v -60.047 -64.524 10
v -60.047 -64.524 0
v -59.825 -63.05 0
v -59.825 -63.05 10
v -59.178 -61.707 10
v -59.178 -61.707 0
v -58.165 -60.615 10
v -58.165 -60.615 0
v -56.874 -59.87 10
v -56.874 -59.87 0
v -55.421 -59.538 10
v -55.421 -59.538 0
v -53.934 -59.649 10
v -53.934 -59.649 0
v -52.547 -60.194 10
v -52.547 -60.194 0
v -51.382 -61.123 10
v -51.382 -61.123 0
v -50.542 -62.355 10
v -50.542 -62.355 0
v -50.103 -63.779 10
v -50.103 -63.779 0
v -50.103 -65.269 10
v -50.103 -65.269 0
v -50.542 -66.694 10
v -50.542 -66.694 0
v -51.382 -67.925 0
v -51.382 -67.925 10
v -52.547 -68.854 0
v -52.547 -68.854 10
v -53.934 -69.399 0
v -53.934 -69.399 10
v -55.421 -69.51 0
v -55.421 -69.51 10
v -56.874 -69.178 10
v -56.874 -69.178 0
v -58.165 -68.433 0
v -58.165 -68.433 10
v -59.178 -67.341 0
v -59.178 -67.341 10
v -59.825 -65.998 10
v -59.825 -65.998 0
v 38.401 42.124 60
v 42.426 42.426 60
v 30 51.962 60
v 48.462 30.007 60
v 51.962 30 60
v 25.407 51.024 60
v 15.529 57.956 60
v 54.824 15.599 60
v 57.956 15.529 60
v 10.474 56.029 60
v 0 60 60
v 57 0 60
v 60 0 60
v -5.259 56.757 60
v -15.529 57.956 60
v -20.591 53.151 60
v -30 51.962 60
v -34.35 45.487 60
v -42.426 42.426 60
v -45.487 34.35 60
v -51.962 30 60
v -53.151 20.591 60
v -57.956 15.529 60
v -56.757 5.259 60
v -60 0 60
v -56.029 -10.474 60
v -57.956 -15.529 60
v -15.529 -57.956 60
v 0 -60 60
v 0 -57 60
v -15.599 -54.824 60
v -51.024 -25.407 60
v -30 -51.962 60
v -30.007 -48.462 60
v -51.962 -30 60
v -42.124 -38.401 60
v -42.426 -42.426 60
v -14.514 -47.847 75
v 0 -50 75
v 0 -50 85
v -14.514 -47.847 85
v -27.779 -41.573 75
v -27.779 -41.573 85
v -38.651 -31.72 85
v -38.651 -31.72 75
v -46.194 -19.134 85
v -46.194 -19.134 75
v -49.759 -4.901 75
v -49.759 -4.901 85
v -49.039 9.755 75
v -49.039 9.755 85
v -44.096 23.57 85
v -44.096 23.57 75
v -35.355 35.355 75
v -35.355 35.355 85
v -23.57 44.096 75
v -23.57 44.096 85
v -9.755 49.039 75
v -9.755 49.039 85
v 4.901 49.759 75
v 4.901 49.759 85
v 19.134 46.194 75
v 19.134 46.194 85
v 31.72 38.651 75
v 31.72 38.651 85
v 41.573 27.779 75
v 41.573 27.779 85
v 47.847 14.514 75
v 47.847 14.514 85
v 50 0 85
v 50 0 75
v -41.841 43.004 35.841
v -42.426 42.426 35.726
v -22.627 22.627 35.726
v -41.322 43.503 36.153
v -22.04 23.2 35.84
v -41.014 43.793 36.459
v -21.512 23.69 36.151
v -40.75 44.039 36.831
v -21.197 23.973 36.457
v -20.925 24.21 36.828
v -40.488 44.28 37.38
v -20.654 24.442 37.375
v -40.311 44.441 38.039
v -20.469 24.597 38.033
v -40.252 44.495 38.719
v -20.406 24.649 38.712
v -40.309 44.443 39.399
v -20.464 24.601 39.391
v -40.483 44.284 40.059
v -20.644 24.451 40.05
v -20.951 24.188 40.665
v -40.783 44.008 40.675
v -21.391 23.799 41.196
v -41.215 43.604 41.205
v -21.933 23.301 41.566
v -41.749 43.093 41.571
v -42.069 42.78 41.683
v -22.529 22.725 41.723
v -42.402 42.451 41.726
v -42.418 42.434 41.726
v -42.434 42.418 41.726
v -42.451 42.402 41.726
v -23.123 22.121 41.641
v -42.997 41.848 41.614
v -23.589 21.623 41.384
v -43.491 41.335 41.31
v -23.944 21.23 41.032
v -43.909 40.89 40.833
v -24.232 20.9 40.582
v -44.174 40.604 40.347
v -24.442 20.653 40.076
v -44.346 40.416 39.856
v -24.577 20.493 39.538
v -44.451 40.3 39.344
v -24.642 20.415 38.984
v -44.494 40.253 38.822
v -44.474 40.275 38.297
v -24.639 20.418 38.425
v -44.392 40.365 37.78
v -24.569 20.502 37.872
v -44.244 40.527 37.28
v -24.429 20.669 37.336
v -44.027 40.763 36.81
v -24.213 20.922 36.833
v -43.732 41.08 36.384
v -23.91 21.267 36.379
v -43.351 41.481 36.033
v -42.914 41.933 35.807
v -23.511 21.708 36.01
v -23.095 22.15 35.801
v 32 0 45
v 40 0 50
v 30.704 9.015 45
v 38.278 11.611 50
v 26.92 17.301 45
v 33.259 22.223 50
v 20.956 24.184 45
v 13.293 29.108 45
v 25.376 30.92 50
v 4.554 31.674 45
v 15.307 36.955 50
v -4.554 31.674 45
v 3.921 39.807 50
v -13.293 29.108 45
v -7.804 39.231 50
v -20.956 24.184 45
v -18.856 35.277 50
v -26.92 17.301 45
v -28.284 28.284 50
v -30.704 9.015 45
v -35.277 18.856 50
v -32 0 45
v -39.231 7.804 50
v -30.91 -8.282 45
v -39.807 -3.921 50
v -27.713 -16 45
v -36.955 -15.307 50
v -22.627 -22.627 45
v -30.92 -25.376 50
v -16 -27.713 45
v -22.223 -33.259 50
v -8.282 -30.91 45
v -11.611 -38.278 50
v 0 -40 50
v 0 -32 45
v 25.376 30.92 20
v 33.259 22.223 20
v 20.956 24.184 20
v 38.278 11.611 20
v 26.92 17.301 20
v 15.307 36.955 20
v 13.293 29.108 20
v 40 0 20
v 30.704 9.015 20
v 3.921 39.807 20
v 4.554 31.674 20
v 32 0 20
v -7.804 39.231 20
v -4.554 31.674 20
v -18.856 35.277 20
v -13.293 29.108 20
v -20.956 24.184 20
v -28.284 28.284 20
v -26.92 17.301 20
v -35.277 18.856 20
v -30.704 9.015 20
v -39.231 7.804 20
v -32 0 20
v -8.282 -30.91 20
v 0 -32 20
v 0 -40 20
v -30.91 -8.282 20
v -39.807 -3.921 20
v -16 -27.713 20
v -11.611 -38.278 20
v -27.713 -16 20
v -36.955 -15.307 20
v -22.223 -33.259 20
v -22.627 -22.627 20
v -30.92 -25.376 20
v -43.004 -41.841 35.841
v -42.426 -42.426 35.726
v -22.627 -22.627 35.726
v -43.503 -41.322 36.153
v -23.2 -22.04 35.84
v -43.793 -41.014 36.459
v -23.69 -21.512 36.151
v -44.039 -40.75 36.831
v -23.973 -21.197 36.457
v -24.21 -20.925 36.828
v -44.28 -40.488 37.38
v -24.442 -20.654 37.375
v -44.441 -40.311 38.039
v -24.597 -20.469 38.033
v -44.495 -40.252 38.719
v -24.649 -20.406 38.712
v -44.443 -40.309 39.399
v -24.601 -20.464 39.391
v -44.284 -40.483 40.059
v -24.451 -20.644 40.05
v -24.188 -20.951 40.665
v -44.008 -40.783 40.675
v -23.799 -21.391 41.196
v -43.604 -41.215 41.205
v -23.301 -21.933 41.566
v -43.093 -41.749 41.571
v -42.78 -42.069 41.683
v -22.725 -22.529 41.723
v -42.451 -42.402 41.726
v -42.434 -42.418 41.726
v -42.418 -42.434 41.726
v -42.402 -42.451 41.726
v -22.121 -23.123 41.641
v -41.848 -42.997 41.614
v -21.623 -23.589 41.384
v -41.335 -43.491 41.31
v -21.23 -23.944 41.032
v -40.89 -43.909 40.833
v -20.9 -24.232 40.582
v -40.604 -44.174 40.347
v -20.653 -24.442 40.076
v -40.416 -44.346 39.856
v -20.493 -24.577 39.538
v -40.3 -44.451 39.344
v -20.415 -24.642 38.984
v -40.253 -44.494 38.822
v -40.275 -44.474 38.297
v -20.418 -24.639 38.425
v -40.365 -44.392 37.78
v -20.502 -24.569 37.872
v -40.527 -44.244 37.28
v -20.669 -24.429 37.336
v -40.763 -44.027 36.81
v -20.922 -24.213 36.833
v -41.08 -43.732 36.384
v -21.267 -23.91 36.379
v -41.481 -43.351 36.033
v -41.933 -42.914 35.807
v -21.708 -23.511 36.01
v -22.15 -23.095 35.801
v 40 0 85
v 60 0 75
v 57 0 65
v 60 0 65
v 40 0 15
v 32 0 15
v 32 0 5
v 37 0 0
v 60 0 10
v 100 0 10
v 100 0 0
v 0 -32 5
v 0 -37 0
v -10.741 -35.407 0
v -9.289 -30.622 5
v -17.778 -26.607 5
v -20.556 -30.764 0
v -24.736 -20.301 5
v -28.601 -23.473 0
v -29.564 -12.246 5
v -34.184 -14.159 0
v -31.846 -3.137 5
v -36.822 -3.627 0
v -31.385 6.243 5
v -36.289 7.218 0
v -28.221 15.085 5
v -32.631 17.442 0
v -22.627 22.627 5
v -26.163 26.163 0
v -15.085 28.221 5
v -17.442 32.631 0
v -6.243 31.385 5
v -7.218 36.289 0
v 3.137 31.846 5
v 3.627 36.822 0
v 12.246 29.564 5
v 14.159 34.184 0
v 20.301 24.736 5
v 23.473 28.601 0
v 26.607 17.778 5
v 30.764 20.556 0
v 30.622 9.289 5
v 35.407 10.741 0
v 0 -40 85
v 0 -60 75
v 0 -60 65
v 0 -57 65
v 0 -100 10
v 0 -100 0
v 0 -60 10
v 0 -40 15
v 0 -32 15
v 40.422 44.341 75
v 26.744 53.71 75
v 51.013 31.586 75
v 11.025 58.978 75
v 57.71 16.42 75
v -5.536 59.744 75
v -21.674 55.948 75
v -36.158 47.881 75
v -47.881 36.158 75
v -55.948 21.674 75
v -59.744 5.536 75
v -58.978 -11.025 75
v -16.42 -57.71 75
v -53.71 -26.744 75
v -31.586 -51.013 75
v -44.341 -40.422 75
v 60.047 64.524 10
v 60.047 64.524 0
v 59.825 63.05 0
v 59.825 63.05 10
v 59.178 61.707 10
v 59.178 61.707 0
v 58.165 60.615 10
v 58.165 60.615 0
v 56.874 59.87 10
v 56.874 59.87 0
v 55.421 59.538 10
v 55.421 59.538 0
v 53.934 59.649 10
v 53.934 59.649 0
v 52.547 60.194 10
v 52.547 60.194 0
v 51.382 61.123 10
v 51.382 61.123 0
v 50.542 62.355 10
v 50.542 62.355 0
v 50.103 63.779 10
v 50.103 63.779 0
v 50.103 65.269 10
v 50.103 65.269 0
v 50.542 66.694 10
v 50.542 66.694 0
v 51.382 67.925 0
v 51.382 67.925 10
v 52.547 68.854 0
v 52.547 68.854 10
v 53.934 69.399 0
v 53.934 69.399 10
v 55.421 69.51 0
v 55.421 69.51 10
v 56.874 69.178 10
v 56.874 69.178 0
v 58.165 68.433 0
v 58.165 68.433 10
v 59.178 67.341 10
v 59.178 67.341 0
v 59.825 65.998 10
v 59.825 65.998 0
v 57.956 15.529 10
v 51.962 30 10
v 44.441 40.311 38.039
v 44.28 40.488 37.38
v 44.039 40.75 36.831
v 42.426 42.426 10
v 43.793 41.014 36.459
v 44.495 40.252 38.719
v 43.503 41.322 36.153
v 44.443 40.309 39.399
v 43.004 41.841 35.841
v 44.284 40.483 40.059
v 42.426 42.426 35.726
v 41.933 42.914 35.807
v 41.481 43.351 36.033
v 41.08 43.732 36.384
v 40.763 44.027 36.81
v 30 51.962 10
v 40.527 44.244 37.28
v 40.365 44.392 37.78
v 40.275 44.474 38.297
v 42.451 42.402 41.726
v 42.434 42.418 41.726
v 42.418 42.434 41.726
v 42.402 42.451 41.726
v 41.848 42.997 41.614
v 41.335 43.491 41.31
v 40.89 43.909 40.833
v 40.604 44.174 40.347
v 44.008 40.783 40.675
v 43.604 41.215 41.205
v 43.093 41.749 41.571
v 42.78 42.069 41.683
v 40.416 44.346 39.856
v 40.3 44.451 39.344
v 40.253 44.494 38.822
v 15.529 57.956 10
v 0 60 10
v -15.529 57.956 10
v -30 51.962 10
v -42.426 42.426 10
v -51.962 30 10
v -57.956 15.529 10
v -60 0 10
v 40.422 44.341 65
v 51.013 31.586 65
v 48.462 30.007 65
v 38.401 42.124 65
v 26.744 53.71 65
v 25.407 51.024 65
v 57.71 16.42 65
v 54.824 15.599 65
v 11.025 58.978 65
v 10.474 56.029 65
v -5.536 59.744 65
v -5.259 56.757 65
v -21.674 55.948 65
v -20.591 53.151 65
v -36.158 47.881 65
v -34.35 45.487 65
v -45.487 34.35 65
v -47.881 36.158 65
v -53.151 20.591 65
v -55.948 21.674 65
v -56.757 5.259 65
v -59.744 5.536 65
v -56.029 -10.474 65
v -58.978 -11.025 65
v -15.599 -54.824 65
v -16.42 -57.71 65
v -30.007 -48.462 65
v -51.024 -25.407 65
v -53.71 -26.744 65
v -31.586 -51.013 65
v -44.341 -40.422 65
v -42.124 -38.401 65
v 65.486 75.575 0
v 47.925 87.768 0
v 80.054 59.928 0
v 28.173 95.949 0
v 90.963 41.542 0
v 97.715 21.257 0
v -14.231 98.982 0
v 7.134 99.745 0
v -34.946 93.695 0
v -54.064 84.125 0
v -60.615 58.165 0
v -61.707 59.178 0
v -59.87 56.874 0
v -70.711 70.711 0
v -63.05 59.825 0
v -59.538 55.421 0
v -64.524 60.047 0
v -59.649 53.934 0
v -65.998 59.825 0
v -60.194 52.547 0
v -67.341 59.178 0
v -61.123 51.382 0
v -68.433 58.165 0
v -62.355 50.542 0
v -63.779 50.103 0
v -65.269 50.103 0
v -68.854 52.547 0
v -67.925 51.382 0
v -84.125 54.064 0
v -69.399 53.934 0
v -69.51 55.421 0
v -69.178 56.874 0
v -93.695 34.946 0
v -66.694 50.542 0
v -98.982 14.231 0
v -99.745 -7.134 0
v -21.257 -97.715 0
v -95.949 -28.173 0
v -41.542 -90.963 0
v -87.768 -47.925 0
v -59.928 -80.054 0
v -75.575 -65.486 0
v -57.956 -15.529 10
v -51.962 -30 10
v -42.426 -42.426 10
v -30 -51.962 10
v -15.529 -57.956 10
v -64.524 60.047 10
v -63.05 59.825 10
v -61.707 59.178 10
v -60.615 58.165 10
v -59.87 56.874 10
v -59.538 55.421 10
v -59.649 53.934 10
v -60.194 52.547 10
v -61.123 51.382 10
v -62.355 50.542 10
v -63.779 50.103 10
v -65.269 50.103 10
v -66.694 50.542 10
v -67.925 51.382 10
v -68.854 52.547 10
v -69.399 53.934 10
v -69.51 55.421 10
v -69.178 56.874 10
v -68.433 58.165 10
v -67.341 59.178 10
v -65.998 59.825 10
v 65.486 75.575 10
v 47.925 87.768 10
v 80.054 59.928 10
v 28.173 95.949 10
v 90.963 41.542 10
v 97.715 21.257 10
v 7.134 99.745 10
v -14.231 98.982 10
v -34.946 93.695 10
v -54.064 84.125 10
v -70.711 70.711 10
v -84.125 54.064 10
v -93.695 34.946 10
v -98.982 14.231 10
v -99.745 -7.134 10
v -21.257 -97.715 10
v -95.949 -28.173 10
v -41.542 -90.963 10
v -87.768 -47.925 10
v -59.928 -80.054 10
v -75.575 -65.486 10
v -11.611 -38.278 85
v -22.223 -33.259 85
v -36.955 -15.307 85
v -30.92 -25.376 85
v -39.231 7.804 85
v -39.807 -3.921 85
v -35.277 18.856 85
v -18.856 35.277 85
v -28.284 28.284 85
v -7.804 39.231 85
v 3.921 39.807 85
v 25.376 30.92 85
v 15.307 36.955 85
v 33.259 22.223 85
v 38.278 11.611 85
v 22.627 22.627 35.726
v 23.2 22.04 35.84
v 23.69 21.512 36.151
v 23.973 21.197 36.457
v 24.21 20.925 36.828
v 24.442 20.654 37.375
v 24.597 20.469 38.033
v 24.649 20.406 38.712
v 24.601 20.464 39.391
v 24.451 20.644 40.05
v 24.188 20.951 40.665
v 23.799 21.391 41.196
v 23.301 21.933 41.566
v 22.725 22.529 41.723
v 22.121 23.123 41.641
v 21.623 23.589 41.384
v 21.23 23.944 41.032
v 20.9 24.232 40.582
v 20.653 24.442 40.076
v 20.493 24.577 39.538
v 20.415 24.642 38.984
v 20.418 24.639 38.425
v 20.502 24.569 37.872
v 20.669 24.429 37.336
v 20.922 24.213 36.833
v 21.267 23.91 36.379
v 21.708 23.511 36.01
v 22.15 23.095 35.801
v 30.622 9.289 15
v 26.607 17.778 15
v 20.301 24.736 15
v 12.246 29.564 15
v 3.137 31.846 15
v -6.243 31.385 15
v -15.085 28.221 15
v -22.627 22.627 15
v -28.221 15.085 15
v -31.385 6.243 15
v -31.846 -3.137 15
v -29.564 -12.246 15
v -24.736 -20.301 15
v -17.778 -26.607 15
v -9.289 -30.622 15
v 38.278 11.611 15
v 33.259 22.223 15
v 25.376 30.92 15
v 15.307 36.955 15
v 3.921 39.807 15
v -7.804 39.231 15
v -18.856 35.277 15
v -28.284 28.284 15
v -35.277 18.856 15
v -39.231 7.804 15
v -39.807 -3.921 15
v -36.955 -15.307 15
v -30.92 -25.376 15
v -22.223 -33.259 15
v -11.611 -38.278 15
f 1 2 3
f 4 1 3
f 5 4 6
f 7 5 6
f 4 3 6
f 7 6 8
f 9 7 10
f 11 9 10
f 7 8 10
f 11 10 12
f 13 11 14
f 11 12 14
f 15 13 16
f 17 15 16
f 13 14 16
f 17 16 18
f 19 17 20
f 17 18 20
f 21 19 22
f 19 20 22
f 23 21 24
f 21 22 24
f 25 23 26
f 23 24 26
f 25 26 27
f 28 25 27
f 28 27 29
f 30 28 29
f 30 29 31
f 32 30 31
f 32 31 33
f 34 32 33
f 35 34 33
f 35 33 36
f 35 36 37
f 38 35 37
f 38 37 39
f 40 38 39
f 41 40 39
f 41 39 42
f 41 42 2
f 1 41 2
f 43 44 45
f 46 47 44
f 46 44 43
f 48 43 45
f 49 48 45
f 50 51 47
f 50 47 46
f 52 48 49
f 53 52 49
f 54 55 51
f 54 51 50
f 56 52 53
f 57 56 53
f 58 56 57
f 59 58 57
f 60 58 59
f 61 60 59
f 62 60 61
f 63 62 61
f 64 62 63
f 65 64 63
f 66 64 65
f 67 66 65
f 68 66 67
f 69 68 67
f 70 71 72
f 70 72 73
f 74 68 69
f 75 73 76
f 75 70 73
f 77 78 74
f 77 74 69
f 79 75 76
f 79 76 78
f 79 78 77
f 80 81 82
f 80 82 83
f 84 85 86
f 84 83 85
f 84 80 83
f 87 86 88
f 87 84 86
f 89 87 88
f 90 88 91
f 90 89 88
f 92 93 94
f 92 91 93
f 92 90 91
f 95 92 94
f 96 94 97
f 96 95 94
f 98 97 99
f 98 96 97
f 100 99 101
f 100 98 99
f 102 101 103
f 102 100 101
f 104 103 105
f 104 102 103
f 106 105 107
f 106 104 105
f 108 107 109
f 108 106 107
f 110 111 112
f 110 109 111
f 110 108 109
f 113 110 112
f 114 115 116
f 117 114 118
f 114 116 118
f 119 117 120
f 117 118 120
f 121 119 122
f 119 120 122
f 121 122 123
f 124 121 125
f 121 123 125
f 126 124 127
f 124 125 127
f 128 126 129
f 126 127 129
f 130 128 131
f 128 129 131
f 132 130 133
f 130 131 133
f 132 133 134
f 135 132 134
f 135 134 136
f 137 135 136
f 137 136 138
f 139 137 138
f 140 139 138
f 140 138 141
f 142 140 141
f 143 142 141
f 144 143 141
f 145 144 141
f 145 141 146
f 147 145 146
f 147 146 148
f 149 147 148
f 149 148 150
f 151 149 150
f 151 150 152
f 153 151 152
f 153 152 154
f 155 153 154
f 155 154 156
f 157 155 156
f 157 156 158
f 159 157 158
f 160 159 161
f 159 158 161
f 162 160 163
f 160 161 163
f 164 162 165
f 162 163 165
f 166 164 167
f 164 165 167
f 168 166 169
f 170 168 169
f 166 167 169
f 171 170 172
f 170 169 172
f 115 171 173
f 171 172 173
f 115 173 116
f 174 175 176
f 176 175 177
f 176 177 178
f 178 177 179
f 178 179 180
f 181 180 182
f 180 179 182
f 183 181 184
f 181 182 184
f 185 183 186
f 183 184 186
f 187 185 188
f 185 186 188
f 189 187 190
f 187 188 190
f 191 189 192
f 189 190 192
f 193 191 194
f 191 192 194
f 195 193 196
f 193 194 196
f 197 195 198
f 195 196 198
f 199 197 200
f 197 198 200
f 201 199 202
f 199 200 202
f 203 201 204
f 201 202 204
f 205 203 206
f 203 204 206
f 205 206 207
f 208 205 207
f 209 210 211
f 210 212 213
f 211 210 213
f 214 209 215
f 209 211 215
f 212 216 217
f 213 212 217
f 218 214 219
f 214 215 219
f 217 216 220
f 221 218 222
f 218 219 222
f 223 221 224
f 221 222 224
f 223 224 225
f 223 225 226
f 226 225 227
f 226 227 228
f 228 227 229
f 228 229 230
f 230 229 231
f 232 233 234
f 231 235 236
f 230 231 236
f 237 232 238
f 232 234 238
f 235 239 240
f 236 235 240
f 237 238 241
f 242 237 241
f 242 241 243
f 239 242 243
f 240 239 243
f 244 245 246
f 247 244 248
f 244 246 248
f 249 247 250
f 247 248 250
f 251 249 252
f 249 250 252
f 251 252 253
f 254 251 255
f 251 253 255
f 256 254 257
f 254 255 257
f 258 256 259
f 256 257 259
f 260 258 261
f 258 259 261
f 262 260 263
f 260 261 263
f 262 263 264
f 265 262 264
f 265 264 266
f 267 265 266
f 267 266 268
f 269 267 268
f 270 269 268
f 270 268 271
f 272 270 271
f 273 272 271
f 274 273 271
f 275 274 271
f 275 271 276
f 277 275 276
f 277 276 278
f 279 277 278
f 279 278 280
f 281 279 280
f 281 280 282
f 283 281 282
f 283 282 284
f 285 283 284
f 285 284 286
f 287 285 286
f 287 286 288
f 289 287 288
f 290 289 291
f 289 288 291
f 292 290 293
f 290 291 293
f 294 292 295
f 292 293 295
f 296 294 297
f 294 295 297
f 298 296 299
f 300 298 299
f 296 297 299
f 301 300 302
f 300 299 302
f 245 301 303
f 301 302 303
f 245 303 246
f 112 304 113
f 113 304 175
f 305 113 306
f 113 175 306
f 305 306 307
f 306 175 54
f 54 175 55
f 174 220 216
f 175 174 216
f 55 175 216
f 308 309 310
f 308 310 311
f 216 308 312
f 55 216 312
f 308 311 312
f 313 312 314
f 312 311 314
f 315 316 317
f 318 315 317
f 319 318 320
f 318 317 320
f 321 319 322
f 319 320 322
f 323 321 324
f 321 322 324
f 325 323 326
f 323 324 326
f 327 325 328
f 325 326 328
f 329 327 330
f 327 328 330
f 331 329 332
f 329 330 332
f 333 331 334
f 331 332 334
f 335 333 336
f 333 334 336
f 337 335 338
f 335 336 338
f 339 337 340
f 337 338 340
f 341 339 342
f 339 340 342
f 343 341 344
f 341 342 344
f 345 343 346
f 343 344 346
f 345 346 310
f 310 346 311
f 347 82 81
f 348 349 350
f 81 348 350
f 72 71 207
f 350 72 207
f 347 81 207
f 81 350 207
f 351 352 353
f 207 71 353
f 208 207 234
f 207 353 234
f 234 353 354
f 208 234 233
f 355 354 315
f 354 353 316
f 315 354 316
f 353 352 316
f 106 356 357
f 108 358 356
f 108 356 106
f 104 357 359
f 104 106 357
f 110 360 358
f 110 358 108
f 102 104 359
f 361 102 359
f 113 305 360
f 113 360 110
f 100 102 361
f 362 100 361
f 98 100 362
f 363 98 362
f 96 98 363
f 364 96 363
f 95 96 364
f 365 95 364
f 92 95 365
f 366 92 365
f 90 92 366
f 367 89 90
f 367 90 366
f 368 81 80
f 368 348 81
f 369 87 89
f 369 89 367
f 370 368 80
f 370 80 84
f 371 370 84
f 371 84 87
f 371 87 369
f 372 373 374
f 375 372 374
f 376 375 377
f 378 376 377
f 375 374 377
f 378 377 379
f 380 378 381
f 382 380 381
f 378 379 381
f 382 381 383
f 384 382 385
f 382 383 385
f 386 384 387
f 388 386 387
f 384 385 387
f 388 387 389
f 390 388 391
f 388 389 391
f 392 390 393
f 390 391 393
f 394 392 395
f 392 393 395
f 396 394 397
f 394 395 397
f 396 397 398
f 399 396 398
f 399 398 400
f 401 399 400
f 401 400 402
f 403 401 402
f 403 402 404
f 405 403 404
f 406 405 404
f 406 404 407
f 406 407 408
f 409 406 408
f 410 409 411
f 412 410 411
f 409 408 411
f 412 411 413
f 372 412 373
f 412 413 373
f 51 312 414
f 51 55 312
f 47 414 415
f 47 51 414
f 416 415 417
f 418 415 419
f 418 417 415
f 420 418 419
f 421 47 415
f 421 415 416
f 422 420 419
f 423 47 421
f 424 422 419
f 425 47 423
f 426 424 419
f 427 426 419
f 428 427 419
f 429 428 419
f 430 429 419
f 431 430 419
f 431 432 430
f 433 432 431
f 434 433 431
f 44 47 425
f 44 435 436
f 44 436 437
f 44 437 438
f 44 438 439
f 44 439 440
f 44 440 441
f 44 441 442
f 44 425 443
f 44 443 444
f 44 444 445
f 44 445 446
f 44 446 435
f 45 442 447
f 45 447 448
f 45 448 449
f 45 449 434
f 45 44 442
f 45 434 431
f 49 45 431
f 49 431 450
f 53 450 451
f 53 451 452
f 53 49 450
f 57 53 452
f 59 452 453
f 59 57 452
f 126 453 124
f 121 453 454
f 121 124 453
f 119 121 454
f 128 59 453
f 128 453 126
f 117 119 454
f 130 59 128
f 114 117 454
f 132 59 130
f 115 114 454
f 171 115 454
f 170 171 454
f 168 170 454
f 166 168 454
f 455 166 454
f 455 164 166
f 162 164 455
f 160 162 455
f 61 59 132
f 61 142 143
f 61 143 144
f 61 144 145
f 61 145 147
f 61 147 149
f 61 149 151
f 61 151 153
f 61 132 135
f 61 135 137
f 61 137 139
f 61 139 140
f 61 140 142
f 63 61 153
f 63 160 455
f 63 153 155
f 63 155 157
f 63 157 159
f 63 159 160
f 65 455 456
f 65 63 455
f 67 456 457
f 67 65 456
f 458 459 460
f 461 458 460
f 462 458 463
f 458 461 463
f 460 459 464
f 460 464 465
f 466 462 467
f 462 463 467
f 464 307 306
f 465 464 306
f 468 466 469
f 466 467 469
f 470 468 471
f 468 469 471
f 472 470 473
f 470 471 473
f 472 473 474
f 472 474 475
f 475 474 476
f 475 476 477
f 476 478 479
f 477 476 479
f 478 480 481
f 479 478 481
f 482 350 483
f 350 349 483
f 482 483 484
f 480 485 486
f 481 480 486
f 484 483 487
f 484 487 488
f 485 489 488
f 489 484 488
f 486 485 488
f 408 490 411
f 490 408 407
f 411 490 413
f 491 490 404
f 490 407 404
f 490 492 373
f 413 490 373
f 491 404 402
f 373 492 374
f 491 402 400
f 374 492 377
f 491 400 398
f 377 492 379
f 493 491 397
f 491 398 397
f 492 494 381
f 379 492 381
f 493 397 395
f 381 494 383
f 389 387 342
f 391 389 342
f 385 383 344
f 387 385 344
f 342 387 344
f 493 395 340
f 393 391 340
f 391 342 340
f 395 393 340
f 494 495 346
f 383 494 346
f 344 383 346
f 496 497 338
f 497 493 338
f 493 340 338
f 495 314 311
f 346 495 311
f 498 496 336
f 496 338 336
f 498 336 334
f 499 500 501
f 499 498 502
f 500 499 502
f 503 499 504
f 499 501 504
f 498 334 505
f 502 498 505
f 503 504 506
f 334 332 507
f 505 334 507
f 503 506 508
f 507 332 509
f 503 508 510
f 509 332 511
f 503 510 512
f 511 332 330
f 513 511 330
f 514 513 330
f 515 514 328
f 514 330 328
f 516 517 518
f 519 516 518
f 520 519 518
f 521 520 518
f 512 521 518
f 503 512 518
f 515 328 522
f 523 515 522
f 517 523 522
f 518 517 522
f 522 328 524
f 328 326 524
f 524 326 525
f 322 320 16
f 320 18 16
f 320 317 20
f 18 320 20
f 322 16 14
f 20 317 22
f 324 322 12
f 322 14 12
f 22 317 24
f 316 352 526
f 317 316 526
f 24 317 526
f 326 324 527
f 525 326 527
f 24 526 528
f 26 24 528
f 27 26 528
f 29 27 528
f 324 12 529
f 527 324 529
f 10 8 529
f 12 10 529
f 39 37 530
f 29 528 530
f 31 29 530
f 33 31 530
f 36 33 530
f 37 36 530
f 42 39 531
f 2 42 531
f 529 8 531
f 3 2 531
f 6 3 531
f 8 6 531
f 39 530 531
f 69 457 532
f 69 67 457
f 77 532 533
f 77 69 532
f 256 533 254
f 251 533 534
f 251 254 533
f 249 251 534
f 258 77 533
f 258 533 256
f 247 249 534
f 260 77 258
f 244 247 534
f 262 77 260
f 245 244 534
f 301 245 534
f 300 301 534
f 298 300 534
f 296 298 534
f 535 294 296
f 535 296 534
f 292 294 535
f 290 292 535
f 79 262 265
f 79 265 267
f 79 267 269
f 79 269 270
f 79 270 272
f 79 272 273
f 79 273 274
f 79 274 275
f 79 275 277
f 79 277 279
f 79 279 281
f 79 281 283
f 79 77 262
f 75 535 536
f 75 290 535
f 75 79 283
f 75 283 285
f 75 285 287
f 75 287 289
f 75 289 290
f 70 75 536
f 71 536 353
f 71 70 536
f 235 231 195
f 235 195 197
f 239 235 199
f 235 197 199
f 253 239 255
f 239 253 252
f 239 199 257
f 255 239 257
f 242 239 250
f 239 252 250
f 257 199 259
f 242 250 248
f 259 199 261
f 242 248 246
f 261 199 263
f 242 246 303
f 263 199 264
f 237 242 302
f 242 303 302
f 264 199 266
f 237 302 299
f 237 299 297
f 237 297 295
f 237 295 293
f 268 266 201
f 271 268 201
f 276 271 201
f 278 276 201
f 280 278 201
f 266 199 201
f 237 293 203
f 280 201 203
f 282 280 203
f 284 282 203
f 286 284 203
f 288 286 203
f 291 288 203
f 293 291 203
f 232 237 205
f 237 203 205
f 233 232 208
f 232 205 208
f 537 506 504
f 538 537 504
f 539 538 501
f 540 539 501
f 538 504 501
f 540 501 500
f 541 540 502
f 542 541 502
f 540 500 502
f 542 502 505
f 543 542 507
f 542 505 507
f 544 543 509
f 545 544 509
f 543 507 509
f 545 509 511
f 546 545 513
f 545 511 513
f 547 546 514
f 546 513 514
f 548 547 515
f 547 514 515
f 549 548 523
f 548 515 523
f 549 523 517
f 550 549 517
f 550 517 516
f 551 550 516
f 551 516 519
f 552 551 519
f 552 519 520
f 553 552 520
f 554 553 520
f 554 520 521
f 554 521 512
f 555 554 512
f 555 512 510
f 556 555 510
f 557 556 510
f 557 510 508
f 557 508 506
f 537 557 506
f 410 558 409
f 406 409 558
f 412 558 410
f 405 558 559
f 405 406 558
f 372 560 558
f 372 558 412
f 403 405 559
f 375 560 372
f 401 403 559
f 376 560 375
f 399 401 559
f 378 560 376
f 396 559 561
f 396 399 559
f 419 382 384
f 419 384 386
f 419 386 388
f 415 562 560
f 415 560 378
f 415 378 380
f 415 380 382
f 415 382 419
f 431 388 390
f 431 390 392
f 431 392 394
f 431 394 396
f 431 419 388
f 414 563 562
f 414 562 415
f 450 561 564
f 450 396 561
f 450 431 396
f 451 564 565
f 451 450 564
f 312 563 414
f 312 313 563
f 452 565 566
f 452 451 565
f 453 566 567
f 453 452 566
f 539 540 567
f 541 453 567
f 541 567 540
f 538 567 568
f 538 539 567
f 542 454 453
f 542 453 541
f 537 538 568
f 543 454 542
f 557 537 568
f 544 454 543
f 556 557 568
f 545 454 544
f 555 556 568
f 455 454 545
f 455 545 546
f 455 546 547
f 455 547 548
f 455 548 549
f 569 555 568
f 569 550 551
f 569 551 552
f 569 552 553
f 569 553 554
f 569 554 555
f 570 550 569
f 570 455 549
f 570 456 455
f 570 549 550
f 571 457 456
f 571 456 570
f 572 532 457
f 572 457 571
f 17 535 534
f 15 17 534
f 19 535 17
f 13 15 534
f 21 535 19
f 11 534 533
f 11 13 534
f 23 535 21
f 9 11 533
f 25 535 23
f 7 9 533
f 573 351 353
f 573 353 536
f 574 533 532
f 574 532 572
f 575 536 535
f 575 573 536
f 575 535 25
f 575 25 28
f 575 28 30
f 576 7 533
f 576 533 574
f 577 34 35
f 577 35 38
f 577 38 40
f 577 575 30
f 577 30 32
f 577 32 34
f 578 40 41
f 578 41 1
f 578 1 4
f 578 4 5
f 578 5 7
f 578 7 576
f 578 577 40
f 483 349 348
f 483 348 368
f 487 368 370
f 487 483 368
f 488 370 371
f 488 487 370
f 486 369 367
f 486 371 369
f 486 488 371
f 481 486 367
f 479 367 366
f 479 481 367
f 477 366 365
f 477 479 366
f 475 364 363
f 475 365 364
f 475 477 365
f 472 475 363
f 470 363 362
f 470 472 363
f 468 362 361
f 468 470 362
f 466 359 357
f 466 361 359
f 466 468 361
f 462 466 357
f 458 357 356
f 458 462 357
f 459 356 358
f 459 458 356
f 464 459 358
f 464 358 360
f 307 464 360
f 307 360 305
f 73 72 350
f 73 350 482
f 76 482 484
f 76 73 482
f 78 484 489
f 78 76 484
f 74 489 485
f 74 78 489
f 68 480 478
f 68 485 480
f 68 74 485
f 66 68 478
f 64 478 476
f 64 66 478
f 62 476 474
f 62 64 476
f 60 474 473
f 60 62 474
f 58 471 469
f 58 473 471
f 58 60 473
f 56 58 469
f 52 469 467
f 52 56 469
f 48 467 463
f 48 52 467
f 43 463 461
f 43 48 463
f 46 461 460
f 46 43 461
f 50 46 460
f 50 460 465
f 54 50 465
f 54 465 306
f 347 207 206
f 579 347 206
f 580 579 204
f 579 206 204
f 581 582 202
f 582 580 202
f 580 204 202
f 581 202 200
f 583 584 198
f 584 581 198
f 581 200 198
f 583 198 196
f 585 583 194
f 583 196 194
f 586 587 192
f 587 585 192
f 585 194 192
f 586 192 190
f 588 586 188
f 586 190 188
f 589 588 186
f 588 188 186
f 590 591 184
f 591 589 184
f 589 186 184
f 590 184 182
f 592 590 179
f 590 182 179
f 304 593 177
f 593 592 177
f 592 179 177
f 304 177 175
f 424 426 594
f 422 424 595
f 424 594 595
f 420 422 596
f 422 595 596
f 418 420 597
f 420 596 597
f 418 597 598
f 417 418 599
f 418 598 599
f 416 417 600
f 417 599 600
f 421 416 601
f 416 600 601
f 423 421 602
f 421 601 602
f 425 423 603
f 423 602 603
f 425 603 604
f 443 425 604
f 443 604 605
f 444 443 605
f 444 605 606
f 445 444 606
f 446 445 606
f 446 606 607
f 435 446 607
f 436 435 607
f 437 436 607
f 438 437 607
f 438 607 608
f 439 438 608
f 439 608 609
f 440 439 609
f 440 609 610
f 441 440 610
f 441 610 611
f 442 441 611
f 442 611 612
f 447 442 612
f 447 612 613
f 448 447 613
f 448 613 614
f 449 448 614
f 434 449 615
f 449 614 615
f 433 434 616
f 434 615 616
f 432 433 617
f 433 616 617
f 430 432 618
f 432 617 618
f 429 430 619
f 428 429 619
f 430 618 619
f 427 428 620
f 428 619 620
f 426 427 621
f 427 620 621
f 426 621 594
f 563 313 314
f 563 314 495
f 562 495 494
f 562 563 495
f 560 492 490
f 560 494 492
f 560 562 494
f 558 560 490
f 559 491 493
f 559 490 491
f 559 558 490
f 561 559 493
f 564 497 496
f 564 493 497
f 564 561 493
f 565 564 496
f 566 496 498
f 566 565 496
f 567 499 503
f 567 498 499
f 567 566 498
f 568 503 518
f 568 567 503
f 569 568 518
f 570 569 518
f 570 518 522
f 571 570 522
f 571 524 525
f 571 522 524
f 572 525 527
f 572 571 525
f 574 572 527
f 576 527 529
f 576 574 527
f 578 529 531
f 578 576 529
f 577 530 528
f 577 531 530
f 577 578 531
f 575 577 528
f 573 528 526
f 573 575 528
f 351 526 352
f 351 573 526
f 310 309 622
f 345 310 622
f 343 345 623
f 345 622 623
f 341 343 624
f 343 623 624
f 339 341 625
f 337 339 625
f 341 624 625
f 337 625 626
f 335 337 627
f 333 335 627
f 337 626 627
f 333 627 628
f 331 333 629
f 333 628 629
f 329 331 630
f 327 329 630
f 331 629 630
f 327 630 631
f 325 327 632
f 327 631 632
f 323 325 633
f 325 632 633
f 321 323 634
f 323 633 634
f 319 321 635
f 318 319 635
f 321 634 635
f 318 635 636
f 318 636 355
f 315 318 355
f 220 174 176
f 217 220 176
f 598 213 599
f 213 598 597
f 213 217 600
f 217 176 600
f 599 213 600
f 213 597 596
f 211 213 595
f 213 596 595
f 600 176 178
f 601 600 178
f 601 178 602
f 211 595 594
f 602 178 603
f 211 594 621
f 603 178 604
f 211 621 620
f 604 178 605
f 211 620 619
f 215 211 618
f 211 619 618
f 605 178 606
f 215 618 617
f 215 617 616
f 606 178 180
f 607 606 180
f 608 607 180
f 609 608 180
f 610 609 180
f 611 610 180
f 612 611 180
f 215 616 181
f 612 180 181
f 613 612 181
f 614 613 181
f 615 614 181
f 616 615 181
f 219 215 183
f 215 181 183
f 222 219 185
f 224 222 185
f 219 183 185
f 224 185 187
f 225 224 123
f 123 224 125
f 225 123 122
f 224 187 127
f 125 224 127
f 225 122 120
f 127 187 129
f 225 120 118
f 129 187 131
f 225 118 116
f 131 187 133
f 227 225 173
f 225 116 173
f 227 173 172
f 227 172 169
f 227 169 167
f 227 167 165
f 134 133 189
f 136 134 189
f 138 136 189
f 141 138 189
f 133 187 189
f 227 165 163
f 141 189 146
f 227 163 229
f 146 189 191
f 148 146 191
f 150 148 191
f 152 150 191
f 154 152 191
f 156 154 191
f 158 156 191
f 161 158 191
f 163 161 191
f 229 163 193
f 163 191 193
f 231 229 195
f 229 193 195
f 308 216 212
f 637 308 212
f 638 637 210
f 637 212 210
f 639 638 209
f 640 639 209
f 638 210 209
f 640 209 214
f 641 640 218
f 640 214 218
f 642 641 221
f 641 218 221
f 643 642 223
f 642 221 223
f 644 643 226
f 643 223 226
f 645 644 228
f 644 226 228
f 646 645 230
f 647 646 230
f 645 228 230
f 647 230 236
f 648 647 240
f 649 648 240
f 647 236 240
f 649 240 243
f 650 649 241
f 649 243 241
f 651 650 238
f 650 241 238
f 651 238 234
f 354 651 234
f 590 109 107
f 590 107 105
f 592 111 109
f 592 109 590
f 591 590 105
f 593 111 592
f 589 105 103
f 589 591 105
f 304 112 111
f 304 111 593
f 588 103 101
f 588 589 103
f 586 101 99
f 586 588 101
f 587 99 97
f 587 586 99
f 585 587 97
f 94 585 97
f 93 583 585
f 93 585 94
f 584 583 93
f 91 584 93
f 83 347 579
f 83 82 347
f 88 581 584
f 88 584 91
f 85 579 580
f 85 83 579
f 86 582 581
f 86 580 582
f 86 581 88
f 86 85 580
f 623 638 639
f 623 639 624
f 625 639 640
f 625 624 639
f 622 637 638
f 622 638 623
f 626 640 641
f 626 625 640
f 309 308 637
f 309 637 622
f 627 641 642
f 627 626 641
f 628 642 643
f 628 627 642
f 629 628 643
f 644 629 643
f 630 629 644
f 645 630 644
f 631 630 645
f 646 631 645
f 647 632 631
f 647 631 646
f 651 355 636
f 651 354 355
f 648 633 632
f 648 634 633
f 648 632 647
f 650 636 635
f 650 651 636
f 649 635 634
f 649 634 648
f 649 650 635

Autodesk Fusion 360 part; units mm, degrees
sketch "Sketch1" plane through (0, 0, 0) normal (0, 1, 0) x (1, 0, 0)
  line L0 (-37, 0) -> (-100, 0)
  line L1 (-100, 0) -> (-100, -10)
  line L2 (-100, -10) -> (-60, -10)
  line L3 (0, -10) -> (0, -5)
  line L4 (-32, -5) -> (-37, 0)
  line L5 (-32, -5) -> (-32, -10)
  line L6 (-40, -85) -> (-50, -85)
  line L7 (-40, -85) -> (-40, -50)
  line L8 (-40, -50) -> (-32, -45)
  line L9 (-50, -75) -> (-60, -75)
  line L10 (-50, -85) -> (-50, -75)
  line L11 (-60, -75) -> (-60, -65)
  line L12 (-60, -65) -> (-57, -65)
  line L13 (-57, -65) -> (-57, -60)
  line L14 (-57, -60) -> (-60, -60)
  line L15 (-32, -5) -> (-32, -15)
  line L16 (-32, -15) -> (-40, -15)
  line L17 (-40, -15) -> (-40, -20)
  line L18 (-40, -20) -> (-32, -20)
  line L19 (-60, -10) -> (-60, -60)
  line L20 (-60, -65) -> (-60, -75)
  line L21 (-32, -5) -> (-32, -15)
  line L22 (-32, -20) -> (-32, -45)
  dimension "d1" = 100
  dimension "d2" = 10
  dimension "d5" = 60
  dimension "d15" = 65
  dimension "d16" = 10
  dimension "d17" = 3
  dimension "d19" = 8
revolve "Revolve1" add sketch "Sketch1" angle 360 about axis through (0, 0, 1.75) along (0, 0, 1) second angle 360
hole "Hole1" at (64.5241, -55.0471, 10) direction (0, 0, -1) diameter 10 depth 10 tip angle 118
pattern_circular "C-Pattern1" count 4 over 360 about axis through (0, 0, 1.75) along (0, 0, 1) of "Hole1"
hole "Hole2" at (-42.4264, -42.4264, 38.7259) direction (0.7071, 0.7071, 0) diameter 6 depth 32 tip angle 118
pattern_circular "C-Pattern2" count 4 over 360 about axis through (0, 0, 1.75) along (0, 0, 1) of "Hole2"
sketch "Sketch2" plane through (0, 0, 0) normal (0, 0, 1) x (1, 0, 0)
  line L0 (0, 0) -> (110, 0)
  line L1 (110, 0) -> (110, -110)
  line L2 (110, -110) -> (0, -110)
  line L3 (0, -110) -> (0, 0)
extrude "Extrude1" cut sketch "Sketch2" along normal blind 110
